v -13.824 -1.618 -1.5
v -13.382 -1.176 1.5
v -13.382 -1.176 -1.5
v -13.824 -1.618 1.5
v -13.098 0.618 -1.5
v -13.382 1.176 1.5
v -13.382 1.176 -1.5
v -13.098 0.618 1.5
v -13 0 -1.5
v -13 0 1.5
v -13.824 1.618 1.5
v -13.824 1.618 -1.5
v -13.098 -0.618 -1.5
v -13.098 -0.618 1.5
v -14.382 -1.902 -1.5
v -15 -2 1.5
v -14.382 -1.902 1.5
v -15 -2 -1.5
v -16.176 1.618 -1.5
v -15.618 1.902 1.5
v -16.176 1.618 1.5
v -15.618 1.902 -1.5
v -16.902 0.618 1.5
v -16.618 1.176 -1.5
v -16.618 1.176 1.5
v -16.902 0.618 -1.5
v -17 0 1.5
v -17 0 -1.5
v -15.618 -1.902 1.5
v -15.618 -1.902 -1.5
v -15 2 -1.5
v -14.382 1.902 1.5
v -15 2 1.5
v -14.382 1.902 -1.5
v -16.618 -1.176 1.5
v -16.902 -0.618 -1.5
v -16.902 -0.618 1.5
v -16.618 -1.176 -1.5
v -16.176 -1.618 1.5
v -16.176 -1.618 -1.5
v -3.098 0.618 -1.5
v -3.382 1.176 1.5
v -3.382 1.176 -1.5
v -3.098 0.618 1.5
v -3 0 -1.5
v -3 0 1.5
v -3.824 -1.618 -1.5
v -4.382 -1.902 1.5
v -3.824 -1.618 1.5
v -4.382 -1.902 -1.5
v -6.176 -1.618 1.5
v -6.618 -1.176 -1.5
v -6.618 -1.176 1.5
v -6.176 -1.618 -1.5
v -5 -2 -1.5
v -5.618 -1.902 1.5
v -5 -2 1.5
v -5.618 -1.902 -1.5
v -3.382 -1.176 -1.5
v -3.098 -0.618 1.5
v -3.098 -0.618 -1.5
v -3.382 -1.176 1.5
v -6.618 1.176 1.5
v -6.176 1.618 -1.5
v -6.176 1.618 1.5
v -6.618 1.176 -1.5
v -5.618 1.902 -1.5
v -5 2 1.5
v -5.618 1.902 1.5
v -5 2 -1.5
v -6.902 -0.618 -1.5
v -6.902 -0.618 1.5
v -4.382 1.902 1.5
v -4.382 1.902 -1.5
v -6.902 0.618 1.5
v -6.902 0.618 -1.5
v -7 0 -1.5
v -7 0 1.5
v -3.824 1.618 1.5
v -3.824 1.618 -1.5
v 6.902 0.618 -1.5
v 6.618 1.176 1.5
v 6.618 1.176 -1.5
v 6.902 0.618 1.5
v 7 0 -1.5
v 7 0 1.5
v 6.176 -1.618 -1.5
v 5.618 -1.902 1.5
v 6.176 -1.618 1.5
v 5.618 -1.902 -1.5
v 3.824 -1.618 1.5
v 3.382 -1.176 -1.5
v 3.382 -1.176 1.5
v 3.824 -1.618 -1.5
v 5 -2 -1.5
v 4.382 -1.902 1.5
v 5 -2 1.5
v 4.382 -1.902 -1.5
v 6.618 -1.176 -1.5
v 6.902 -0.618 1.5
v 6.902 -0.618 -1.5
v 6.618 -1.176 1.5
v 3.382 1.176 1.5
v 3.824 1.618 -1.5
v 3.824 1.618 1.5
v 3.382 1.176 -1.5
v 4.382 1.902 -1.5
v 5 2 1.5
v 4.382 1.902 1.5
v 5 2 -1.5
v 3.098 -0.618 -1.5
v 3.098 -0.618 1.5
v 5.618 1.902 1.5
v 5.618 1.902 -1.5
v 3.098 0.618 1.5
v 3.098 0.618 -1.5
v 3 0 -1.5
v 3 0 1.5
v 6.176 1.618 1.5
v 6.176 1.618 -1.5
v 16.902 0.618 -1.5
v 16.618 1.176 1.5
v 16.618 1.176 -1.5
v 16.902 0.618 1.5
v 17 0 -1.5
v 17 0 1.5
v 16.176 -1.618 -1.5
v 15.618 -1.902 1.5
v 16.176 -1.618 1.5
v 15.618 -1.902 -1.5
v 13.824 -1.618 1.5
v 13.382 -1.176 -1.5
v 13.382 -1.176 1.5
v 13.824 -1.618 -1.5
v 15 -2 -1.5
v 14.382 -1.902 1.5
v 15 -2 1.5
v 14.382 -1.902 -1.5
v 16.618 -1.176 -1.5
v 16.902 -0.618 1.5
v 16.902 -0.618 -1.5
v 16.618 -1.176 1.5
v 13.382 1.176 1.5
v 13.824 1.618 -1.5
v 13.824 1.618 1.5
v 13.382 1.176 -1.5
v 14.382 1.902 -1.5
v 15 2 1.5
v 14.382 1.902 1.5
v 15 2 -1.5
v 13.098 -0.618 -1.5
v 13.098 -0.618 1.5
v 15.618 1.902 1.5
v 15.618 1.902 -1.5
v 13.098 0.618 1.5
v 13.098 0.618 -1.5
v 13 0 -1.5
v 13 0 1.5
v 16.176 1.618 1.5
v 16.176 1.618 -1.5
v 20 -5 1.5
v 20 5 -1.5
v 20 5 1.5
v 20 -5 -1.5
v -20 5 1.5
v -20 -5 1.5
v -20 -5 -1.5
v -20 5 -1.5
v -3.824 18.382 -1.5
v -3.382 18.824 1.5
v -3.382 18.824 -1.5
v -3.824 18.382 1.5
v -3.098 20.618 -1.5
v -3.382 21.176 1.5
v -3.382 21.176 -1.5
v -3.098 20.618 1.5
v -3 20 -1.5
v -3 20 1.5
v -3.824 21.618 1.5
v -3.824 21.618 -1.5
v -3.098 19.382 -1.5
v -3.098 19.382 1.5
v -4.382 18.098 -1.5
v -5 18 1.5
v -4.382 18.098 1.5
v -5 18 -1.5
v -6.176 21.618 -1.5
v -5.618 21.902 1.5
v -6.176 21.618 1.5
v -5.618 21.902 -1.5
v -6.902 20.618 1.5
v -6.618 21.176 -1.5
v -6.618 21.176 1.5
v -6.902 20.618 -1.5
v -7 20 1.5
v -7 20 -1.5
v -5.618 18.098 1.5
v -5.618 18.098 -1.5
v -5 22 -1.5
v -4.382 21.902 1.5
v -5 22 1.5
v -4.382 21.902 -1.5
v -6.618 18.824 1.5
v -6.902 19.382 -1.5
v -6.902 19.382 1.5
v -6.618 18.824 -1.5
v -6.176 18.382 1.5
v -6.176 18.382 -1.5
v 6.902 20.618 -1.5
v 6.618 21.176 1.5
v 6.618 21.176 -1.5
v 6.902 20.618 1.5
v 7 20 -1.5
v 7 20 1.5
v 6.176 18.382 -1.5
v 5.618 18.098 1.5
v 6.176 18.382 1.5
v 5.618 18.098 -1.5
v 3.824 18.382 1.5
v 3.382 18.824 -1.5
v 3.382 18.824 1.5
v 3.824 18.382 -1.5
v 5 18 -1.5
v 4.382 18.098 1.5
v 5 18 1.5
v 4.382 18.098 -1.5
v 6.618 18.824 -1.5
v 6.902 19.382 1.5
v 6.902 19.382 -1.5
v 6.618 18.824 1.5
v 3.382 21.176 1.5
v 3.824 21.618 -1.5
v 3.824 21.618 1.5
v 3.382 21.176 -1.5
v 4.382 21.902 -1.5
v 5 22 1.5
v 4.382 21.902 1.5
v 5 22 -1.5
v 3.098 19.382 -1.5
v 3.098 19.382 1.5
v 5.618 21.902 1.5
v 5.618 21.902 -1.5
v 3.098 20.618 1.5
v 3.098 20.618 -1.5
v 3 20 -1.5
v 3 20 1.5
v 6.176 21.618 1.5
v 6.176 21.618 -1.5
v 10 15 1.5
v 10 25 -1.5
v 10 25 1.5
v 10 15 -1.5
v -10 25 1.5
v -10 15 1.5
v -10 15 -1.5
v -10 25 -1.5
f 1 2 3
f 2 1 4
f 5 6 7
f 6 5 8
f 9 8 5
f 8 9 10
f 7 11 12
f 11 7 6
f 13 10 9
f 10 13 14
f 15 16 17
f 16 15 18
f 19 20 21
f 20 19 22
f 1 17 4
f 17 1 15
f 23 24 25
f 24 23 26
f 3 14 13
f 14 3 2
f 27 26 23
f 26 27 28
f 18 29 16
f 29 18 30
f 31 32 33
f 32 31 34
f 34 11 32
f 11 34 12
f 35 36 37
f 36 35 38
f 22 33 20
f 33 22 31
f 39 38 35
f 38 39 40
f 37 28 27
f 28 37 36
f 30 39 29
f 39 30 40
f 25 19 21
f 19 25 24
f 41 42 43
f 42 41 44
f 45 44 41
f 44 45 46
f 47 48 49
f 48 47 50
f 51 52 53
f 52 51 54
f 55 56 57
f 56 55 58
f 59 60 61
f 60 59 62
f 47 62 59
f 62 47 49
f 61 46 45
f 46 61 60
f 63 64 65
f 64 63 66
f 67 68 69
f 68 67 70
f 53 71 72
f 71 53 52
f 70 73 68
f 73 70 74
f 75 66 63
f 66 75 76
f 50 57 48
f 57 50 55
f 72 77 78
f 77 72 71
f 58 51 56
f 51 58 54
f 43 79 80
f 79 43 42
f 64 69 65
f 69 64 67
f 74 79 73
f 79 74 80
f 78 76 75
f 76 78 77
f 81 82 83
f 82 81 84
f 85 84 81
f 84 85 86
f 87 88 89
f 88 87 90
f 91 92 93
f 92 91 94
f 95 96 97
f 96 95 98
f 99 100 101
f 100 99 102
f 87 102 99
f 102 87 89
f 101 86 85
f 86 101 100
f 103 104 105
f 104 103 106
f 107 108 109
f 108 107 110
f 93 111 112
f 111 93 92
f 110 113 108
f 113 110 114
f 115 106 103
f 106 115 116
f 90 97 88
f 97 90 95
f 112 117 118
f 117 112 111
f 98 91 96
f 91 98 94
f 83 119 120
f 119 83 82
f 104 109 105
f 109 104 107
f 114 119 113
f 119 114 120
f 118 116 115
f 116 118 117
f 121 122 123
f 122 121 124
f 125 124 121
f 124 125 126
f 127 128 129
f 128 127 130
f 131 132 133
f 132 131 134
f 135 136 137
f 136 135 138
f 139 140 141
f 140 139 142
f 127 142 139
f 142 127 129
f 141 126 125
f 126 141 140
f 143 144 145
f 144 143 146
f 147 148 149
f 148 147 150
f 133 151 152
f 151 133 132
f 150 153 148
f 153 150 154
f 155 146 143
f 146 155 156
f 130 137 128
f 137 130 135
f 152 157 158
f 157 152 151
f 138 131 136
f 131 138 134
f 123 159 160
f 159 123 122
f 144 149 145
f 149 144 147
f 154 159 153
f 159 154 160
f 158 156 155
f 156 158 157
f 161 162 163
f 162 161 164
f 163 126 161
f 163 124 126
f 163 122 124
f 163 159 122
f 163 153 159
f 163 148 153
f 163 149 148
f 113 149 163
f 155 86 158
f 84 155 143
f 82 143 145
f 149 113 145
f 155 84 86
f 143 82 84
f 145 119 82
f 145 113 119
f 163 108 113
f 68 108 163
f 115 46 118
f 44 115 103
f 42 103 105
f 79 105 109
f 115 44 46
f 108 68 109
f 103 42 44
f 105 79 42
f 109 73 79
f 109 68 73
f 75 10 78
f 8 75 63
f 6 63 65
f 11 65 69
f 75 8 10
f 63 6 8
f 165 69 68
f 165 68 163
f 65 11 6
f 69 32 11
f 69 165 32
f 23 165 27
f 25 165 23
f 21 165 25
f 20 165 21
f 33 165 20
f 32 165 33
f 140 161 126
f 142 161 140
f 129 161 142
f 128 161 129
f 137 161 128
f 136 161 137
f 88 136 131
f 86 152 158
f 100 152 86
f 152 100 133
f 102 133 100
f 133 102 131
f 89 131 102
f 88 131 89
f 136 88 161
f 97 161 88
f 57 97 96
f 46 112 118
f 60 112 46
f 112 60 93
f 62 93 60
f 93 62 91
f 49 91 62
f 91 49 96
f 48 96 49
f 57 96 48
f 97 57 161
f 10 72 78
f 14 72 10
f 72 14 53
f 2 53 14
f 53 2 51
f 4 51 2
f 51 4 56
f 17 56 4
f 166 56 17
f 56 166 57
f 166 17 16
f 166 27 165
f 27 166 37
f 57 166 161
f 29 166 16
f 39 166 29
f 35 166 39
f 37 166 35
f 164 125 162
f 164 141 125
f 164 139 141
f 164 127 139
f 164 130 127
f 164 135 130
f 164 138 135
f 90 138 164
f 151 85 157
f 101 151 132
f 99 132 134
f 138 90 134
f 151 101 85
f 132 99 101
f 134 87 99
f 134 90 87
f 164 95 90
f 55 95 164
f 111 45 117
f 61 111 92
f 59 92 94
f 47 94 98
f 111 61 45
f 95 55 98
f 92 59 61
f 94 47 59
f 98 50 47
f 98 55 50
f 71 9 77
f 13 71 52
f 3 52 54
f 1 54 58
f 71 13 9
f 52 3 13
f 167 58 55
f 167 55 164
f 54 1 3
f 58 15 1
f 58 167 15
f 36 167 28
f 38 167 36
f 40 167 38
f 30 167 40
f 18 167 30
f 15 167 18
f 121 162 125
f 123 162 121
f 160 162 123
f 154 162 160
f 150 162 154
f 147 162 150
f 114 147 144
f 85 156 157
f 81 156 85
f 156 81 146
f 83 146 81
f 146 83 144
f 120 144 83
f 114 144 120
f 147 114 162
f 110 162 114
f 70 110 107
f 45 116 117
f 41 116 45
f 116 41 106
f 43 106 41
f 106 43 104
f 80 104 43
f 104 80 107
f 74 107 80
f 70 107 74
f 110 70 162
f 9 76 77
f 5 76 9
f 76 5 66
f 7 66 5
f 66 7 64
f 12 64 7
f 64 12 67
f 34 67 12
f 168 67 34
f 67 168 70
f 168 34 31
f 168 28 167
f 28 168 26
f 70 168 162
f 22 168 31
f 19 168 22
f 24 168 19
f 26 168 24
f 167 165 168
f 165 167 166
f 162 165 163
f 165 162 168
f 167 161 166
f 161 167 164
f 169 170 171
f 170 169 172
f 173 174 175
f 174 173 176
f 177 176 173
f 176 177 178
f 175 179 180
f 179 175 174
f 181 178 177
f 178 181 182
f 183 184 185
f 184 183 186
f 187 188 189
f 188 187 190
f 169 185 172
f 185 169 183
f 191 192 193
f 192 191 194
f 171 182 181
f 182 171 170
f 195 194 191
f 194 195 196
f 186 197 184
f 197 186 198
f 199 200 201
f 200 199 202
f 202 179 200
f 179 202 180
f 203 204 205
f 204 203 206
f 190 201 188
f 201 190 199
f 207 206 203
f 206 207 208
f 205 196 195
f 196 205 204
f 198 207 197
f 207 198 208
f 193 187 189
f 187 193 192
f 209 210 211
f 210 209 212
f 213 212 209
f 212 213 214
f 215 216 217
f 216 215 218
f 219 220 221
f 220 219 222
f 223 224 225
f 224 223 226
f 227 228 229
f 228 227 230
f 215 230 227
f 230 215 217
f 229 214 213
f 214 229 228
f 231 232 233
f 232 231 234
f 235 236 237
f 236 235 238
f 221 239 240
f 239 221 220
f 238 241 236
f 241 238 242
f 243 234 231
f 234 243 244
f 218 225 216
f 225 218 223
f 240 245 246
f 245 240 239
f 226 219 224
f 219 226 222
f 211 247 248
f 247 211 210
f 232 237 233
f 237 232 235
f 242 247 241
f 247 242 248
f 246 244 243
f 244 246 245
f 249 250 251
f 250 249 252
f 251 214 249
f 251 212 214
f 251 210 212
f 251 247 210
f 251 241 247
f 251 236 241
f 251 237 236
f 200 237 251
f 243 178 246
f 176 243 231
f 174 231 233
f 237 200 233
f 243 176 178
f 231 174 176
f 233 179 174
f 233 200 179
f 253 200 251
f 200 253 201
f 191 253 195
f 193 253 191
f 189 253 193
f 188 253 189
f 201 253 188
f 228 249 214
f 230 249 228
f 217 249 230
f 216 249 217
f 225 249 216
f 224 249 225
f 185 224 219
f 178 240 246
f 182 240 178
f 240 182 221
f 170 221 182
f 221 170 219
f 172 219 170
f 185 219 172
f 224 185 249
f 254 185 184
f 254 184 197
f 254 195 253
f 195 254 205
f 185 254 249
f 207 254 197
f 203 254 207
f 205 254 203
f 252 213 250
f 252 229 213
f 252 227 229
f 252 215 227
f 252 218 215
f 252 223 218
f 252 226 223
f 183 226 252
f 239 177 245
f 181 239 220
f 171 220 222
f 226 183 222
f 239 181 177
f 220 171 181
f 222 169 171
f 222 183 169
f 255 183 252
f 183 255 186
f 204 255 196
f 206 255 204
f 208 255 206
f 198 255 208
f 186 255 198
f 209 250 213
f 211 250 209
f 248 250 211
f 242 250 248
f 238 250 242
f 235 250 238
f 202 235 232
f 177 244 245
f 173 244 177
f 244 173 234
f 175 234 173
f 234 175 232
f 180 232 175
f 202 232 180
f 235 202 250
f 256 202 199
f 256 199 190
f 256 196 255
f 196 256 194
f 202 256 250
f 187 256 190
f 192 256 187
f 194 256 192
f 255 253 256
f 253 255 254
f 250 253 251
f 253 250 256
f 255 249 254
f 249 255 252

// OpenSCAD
// file: utils/build_plate.scad
// Build Plate representation module
// Made by Makerbot (http://curriculum.makerbot.com/daily_lessons/february/openscad_buildplate.html)

//use this to include a build plate visualization in your openSCAD scripts. Very useful for things designed to be edited in Makerbot Customizer

//to use, either include or use <utils/build_plate.scad>

//then just call build_plate(); with the following arguments (also, you have to have a real object in your scene for this to render)

//putting 0 as the first argument will give you a Replicator 2 build plate
//putting 1 as the first argument will give you a Replicator 1 build plate
//putting 2 as the first argument will give you a Thingomatic build plate
//putting 3 as the first argument will give you a manually adjustable build plate (note: if you use this option, you need to specify your build plates X length (in mm) as the second argument and the Y length (in mm) as the third argument. eg. build_plate(3,150,120);)

/*

to give your user control of which build plate they see in Customizer, include the following code:

use <utils/build_plate.scad>

//for display only, doesn't contribute to final object
build_plate_selector = 0; //[0:Replicator 2,1: Replicator,2:Thingomatic,3:Manual]
//when Build Plate Selector is set to "manual" this controls the build plate x dimension
build_plate_manual_x = 100; //[100:400]
//when Build Plate Selector is set to "manual" this controls the build plate y dimension
build_plate_manual_y = 100; //[100:400]

build_plate(build_plate_selector,build_plate_manual_x,build_plate_manual_y);

*/




//to see how this works, uncomment the following code

//build_plate_selector = 0; //[0:Replicator 2,1: Replicator,2:Thingomatic,3:Manual]
//build_plate_manual_x = 100; //[100:400]
//build_plate_manual_y = 100; //[100:400]
//
//build_plate(build_plate_selector,build_plate_manual_x,build_plate_manual_y);
//
//cube(5);


module build_plate(bp,manX,manY){

		translate([0,0,-.52]){
			if(bp == 0){
				%cube([285,153,1],center = true);
			}
			if(bp == 1){
				%cube([225,145,1],center = true);
			}
			if(bp == 2){
				%cube([120,120,1],center = true);
			}
			if(bp == 3){
				%cube([manX,manY,1],center = true);
			}
		
		}
		translate([0,0,-.5]){
			if(bp == 0){
				for(i = [-14:14]){
					translate([i*10,0,0])
					%cube([.5,153,1.01],center = true);
				}
				for(i = [-7:7]){
					translate([0,i*10,0])
					%cube([285,.5,1.01],center = true);
				}	
			}
			if(bp == 1){
				for(i = [-11:11]){
					translate([i*10,0,0])
						%cube([.5,145,1.01],center = true);
				}
				for(i = [-7:7]){
					translate([0,i*10,0])
						%cube([225,.5,1.01],center = true);
				}
			}
			if(bp == 2){
				for(i = [-6:6]){
					translate([i*10,0,0])
						%cube([.5,120,1.01],center = true);
				}
				for(i = [-6:6]){
					translate([0,i*10,0])
						%cube([120,.5,1.01],center = true);
				}
			}
			if(bp == 3){
				for(i = [-(floor(manX/20)):floor(manX/20)]){
					translate([i*10,0,0])
						%cube([.5,manY,1.01],center = true);
				}
				for(i = [-(floor(manY/20)):floor(manY/20)]){
					translate([0,i*10,0])
						%cube([manX,.5,1.01],center = true);
				}
			}
		}
}
// main file
use <./utils/build_plate.scad> // Cuadricula transparente para la base
build_plate(3, 200,100); // No se incluye al renderizar


//----------------------------------------------------------
//-- Tutorial OpenScad
//-- Juan Gonzalez-Gomez (Obijuan) juan@iearobotics.com
//----------------------------------------------------------
//-- (c) Mayo, 2012
//-- Licencia GPL
//----------------------------------------------------------
//-- Ejemplo 1: Pieza de mecano
//-- Pieza basica de mecano, parametrizada, en un modulo
//-- y con parmaetros por defecto
//----------------------------------------------------------

module pieza_mecano(n=4, drill=4, d=10, anchura=10, grosor=3)
{
  //-- Calcular al longitud de la pieza
  lx = n*d;

  //-- Construir la pieza
  difference() {
    //-- Cuerpo de la pieza
    cube([lx,anchura,grosor],center=true);

    //-- Taladros
    translate([-lx/2+d/2,0,0])
      for (i=[0:n-1]) {
        translate([i*d,0,0])
          cylinder(r=drill/2, h=grosor+5, $fn=20,center=true);
     }
  }
}

//-- Ejemplos de utilizacion
pieza_mecano();

translate([0,20,0])
  pieza_mecano(n=2);
